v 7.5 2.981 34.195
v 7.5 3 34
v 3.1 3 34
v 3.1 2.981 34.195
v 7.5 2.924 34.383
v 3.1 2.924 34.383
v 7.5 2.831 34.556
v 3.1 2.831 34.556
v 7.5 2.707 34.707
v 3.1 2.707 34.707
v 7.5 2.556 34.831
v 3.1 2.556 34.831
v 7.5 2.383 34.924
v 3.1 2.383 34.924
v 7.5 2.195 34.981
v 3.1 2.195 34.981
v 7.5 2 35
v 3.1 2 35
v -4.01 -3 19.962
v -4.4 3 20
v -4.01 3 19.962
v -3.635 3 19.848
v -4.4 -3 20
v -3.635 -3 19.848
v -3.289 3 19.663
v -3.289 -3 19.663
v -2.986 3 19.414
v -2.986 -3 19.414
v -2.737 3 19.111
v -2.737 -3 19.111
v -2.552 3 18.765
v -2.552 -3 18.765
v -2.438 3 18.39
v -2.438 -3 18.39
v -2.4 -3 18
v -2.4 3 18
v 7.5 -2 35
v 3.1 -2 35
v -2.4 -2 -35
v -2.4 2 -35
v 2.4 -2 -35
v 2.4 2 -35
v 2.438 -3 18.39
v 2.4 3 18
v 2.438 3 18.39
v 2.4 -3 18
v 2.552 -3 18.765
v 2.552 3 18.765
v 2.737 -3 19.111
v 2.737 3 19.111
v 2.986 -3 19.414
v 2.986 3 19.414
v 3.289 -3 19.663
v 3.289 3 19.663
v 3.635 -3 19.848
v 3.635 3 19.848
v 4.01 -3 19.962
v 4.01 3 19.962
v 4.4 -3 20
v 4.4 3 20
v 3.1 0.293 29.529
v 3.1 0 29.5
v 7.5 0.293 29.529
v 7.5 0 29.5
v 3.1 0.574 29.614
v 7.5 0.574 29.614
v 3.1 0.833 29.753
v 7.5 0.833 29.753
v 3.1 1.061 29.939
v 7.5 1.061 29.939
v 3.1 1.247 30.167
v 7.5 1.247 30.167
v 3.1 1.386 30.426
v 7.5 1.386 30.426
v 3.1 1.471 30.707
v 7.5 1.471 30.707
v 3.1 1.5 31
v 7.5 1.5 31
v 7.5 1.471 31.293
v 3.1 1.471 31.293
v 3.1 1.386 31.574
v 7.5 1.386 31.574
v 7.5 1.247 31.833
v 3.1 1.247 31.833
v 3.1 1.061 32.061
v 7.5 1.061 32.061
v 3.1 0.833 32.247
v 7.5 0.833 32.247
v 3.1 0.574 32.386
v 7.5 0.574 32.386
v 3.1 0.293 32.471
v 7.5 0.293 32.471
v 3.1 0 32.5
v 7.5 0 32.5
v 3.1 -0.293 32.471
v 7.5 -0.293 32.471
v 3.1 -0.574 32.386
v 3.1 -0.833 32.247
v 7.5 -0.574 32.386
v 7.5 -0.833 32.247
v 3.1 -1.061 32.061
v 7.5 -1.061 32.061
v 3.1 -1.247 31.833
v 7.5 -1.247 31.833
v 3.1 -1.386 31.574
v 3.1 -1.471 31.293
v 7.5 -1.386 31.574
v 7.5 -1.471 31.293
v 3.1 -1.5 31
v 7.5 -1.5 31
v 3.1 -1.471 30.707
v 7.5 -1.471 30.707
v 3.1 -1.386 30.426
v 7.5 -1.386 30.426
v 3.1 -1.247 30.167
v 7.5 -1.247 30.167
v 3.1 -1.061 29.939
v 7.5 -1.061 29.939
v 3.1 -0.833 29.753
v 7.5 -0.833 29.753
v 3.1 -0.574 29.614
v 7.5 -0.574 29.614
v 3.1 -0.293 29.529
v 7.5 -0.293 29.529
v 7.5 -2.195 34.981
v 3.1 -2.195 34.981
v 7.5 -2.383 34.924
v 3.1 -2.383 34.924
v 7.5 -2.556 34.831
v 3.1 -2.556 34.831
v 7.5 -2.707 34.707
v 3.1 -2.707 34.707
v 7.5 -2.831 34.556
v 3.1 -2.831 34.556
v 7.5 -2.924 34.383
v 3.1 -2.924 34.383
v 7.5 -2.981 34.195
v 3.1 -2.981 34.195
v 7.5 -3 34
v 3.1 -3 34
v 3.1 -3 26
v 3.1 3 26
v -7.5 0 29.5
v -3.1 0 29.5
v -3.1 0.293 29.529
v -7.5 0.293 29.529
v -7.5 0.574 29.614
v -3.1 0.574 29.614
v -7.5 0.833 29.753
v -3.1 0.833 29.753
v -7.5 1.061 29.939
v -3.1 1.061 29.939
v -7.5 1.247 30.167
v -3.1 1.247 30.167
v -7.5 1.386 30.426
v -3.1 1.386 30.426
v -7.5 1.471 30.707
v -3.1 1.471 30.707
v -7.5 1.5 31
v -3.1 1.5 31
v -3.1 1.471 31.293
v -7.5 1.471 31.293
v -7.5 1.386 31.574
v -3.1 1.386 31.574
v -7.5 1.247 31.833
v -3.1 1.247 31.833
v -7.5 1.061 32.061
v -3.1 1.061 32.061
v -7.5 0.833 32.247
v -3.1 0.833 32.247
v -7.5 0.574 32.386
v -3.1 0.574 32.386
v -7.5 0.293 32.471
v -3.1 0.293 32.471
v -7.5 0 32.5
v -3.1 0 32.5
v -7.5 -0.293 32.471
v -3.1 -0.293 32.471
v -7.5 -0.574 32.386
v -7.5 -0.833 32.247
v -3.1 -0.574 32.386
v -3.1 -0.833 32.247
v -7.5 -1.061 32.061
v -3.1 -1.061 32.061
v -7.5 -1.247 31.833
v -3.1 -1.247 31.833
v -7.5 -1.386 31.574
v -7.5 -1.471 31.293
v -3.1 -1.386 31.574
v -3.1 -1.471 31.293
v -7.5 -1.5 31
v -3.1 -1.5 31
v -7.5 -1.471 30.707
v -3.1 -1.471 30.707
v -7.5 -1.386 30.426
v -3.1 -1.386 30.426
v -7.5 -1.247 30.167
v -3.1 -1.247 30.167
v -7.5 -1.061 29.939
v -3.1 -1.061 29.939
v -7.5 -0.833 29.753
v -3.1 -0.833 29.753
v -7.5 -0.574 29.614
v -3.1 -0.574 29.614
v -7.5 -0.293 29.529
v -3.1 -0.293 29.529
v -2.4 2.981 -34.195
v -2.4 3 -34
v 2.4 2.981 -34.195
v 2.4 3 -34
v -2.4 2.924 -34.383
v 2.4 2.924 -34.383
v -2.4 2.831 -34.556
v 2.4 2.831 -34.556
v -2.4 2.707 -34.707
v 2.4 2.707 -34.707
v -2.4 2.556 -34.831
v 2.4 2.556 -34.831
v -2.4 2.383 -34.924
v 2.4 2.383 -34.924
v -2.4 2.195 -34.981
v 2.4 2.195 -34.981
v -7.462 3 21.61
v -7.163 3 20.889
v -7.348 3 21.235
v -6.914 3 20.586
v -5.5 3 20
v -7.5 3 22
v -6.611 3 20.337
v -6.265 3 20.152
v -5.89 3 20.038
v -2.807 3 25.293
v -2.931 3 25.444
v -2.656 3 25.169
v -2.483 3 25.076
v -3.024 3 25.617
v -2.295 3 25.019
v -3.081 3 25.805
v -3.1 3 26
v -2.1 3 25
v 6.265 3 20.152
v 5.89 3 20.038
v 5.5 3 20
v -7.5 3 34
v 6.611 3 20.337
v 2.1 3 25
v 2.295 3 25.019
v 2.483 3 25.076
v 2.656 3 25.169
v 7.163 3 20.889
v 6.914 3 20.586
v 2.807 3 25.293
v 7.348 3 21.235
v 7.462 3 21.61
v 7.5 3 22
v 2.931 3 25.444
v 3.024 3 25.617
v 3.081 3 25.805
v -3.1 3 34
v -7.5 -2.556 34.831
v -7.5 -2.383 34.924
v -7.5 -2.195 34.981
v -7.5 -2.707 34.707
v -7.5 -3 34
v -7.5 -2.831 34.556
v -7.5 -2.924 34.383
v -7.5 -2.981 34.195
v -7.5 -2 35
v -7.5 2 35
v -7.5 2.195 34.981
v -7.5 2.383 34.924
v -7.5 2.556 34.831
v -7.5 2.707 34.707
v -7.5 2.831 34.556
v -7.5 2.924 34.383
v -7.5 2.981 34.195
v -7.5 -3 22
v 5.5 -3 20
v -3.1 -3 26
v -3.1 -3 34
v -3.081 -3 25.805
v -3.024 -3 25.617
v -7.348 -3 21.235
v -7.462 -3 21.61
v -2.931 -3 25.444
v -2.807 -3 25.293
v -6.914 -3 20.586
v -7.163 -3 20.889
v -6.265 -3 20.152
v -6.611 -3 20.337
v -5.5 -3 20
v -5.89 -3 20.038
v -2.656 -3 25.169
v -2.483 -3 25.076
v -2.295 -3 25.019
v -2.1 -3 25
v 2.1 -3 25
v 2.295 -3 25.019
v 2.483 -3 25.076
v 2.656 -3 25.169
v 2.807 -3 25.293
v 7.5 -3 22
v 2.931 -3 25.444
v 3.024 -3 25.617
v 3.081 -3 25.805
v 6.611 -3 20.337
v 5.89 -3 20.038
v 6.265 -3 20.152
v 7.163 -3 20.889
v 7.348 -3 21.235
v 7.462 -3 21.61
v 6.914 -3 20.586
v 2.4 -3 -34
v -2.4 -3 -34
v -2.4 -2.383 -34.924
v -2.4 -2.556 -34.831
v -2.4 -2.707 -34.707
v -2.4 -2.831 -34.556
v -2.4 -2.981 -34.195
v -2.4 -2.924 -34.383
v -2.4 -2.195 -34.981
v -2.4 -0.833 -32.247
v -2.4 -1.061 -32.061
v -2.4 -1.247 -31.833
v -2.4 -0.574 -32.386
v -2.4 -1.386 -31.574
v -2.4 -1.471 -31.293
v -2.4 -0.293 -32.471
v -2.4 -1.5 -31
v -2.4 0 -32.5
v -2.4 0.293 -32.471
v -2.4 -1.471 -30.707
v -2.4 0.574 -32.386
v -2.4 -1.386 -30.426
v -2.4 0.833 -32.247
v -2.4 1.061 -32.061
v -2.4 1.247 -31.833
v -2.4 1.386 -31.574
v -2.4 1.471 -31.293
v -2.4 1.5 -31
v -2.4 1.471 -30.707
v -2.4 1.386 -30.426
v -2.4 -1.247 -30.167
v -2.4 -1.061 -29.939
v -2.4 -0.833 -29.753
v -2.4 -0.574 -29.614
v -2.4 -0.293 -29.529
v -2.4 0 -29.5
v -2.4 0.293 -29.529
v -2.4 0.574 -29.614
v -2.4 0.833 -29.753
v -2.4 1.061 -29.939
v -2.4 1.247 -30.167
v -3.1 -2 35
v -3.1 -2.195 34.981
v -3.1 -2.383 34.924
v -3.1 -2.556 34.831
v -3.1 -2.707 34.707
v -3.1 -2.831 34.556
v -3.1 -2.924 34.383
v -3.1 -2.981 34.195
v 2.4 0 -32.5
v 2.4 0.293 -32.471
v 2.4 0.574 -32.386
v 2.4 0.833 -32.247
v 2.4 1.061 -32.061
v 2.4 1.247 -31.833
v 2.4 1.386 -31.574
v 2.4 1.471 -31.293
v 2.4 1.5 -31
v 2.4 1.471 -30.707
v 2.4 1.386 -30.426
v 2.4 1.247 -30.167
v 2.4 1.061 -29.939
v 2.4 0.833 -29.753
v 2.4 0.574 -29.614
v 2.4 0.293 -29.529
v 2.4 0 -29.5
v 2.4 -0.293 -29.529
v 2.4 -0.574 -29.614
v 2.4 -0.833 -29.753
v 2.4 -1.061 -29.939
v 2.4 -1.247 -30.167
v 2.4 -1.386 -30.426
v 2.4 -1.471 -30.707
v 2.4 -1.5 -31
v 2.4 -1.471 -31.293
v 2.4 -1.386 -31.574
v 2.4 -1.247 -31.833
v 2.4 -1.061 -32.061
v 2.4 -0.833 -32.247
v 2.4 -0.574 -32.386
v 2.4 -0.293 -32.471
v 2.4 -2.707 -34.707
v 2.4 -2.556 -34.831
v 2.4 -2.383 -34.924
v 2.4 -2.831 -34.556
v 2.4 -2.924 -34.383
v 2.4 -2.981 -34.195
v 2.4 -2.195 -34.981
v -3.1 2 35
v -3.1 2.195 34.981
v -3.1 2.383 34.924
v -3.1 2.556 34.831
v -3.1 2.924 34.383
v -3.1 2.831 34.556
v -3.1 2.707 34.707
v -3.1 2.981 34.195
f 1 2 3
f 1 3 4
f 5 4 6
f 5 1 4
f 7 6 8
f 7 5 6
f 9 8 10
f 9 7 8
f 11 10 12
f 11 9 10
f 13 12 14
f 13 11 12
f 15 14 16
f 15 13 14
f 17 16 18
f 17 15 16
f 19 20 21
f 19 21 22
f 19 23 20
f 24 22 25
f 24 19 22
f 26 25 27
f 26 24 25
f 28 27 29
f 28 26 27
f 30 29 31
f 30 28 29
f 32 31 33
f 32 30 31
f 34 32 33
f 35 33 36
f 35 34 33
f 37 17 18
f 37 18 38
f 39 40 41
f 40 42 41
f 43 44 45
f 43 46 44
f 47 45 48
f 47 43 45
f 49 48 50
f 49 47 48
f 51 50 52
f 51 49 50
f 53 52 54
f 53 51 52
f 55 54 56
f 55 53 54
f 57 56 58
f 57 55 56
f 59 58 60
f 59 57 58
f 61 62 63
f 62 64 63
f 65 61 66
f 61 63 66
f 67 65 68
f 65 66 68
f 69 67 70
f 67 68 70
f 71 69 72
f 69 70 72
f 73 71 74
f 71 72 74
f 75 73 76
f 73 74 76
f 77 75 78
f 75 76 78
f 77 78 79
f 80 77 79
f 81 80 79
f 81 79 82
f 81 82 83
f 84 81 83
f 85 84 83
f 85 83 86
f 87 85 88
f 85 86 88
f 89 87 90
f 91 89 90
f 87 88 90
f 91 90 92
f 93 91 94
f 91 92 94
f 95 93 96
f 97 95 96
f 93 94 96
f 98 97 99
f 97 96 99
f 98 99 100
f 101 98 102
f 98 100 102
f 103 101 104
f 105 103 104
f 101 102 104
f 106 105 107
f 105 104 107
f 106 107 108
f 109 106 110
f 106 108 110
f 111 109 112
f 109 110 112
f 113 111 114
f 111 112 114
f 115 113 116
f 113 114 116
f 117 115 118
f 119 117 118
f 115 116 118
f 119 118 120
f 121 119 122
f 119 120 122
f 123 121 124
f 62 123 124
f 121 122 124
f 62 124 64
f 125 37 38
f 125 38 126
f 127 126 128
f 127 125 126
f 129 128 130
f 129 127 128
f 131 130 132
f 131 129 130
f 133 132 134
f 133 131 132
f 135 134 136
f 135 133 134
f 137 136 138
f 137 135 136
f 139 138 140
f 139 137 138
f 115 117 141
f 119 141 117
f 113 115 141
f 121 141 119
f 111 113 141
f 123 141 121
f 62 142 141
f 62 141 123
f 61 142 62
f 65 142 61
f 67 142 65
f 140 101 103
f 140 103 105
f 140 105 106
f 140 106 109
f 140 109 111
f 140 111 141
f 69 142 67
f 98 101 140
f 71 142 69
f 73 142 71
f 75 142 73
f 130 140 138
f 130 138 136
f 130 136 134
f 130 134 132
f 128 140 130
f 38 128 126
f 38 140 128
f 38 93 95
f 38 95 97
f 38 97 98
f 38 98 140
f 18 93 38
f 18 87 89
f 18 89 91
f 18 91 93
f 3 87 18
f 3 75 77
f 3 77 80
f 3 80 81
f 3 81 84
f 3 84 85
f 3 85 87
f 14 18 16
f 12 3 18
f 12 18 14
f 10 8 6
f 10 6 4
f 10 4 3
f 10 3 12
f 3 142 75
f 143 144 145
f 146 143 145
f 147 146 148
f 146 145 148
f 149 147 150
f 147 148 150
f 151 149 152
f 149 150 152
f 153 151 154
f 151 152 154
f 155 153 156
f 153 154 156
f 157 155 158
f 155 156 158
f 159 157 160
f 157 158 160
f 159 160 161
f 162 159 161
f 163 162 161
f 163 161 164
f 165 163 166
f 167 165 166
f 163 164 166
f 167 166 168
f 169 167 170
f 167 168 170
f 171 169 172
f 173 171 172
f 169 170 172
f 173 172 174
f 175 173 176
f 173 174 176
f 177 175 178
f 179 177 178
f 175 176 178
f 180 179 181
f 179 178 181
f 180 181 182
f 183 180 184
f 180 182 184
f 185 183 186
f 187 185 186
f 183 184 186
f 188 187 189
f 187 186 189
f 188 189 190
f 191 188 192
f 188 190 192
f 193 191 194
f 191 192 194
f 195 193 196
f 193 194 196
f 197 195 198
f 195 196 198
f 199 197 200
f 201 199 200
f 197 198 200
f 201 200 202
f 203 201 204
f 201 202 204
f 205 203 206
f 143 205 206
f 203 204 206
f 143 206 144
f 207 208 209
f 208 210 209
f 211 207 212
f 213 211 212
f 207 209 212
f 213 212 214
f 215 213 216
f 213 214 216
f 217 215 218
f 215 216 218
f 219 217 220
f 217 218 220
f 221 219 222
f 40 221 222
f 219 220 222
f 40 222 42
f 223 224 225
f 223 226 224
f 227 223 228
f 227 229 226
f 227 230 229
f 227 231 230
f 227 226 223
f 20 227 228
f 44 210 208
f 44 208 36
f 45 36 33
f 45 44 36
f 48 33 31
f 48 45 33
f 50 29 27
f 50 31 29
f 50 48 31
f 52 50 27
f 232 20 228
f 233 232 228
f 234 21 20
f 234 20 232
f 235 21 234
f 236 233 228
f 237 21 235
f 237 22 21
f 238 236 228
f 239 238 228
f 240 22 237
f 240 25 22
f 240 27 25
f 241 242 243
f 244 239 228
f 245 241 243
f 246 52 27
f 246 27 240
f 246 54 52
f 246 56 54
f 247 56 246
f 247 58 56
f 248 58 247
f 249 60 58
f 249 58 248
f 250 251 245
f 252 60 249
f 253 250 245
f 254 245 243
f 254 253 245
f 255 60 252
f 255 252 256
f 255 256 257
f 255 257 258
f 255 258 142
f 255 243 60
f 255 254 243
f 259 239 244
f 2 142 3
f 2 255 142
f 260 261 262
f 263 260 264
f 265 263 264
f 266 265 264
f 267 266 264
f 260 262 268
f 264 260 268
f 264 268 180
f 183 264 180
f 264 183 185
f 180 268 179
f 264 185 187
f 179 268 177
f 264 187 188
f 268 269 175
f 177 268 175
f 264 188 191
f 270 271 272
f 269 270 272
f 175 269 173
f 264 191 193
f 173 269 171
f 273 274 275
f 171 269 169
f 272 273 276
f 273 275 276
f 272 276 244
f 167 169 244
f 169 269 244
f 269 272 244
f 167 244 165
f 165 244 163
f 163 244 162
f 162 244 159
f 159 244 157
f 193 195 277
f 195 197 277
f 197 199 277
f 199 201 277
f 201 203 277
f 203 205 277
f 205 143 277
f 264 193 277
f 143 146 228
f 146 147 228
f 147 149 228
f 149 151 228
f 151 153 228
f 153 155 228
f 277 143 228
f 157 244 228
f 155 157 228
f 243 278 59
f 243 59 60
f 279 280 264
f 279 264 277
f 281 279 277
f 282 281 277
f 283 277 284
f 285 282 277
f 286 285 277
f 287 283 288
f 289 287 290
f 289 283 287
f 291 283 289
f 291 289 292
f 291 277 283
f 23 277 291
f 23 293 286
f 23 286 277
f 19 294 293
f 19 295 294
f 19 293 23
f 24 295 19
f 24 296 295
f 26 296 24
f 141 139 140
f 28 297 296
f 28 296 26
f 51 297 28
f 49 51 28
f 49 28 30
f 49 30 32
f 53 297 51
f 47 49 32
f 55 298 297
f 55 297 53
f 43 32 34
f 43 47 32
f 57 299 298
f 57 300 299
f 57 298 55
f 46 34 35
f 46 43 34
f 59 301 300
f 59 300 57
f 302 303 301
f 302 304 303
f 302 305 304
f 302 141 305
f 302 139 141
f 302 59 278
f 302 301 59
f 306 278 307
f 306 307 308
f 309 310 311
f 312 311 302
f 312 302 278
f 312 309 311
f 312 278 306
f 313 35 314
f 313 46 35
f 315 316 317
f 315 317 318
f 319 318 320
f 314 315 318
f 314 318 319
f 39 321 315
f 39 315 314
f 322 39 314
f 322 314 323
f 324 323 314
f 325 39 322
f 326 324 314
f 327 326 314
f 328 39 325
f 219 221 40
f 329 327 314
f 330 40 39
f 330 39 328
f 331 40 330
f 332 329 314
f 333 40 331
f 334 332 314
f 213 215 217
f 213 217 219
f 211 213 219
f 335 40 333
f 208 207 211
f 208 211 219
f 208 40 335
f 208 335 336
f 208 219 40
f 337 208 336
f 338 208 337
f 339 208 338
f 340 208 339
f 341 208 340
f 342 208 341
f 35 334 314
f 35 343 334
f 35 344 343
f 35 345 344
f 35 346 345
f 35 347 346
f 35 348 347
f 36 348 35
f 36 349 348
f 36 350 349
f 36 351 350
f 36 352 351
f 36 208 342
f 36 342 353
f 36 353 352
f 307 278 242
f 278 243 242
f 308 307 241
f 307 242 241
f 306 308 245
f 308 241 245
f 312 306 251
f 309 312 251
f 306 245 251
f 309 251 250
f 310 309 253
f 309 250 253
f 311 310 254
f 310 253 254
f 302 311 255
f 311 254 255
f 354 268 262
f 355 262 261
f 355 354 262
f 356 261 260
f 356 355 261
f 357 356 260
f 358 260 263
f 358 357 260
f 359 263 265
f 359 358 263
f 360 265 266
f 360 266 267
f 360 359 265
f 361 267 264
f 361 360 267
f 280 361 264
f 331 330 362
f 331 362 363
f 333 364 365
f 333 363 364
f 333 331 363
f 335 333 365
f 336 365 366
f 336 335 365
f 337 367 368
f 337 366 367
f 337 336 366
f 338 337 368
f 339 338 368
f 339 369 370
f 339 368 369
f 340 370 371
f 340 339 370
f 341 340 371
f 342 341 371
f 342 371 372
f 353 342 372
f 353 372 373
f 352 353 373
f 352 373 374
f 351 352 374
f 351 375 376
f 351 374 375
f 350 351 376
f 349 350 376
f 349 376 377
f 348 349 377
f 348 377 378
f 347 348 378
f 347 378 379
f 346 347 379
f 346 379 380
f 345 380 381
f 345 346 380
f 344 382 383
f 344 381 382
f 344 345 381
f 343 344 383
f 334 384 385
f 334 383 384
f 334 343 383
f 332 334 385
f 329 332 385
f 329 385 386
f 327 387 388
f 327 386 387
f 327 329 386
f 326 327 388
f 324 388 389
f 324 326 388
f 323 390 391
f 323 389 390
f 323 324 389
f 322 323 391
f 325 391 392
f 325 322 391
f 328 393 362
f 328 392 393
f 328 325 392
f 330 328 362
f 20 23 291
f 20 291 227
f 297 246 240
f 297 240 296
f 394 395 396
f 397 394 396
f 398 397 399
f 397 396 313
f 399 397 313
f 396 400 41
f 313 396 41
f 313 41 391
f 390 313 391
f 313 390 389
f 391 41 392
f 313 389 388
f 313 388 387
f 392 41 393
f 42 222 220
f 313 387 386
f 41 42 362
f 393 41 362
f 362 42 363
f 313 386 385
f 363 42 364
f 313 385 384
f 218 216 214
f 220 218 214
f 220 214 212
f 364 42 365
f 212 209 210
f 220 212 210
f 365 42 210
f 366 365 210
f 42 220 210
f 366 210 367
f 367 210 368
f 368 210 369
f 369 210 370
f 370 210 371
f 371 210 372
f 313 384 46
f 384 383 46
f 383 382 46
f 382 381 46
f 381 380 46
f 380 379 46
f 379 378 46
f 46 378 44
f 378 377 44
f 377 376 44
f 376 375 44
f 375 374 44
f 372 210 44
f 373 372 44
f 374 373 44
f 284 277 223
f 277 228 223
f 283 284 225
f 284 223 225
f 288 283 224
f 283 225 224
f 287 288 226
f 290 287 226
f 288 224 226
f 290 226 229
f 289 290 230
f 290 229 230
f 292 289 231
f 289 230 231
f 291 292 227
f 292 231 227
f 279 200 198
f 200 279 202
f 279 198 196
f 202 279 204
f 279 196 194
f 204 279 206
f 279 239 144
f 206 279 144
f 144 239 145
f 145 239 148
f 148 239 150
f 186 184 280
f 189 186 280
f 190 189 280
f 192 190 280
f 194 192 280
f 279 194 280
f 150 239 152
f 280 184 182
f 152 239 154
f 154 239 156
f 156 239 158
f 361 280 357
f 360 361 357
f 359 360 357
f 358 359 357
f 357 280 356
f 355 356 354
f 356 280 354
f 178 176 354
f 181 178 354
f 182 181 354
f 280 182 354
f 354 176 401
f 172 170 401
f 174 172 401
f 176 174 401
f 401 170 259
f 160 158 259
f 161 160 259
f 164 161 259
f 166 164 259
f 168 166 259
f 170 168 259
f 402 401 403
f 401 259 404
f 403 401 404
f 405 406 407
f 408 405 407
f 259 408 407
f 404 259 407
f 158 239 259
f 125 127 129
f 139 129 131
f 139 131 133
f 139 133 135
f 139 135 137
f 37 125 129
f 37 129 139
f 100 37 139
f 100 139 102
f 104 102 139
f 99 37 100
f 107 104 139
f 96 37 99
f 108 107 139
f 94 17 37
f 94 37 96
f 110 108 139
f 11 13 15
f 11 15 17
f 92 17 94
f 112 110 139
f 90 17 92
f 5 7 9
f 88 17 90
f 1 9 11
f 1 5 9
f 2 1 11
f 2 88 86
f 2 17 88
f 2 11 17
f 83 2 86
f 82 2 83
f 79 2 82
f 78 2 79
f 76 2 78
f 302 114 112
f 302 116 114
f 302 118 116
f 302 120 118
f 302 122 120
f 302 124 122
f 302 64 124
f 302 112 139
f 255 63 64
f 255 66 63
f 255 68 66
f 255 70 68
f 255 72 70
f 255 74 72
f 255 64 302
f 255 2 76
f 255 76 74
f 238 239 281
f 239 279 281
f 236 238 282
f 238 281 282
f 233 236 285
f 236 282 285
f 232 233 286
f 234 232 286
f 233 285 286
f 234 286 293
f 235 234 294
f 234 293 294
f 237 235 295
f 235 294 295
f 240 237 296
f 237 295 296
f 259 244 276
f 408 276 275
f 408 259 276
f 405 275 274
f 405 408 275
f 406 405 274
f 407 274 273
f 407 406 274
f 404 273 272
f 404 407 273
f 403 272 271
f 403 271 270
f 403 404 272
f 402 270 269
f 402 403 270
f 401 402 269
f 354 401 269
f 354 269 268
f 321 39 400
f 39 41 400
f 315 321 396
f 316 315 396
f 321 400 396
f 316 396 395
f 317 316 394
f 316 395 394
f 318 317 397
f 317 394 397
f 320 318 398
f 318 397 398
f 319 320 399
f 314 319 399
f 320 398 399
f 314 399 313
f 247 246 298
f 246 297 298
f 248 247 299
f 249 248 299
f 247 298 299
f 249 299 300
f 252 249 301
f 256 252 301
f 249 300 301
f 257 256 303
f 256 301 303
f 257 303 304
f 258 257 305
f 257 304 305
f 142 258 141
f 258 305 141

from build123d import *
from build123d.topology import SkipClean

# Parameters (mm, degrees)
SALIENTE_EXTRUIR1_DEPTH    = 2.4
CORTAR_EXTRUIR1_DEPTH      = 36.210225787
CORTAR_EXTRUIR1_DEPTH_BACK = 36.210225787
CROQUIS2_R                 = 1.5
CROQUIS3_R                 = 1.5
SALIENTE_EXTRUIR2_DEPTH    = 7.5
CORTAR_EXTRUIR2_DEPTH      = 3.1
REDONDEO1_R                = 2
REDONDEO2_R                = 1


with BuildPart() as part:
    # Croquis1 → Saliente-Extruir1 (new, symmetric)
    with BuildSketch(Plane(origin=(0, 0, 0), x_dir=(0, 0, -1), z_dir=(1, 0, 0))):
        with BuildLine():
            Line((-34, 3), (34, 3))
            ThreePointArc((34, 3), (34.707106781, 2.707106781), (35, 2))
            Line((35, 2), (35, -2))
            ThreePointArc((35, -2), (34.707106781, -2.707106781), (34, -3))
            Line((34, -3), (-34, -3))
            ThreePointArc((-34, -3), (-34.707106781, -2.707106781), (-35, -2))
            Line((-35, -2), (-35, 2))
            ThreePointArc((-35, 2), (-34.707106781, 2.707106781), (-34, 3))
        make_face()
    extrude(amount=SALIENTE_EXTRUIR1_DEPTH, both=True)

    # Croquis2 → Cortar-Extruir1 (cut, two sides: drawn at the far end of the back side and taken through both)
    with BuildSketch(Plane(origin=(0, 0, 0), x_dir=(0, 0, -1), z_dir=(1, 0, 0)).offset(-CORTAR_EXTRUIR1_DEPTH_BACK)):
        with Locations((-31, 0)):
            Circle(CROQUIS2_R)
        with Locations((31, 0)):
            Circle(CROQUIS2_R)
    extrude(amount=CORTAR_EXTRUIR1_DEPTH + CORTAR_EXTRUIR1_DEPTH_BACK, mode=Mode.SUBTRACT)

    # Croquis3 → Saliente-Extruir2 (add, symmetric)
    with SkipClean():  # the faces are left unmerged after this step: merging them gives an invalid solid
        with BuildSketch(Plane(origin=(0, 0, 0), x_dir=(0, 0, -1), z_dir=(1, 0, 0))):
            with BuildLine():
                Line((-35, 2), (-35, -2))
                ThreePointArc((-35, -2), (-34.707106781, -2.707106781), (-34, -3))
                Line((-34, -3), (-20, -3))
                Line((-20, -3), (-20, 3))
                Line((-20, 3), (-34, 3))
                ThreePointArc((-34, 3), (-34.707106781, 2.707106781), (-35, 2))
            make_face()
            with Locations((-31, 0)):
                Circle(CROQUIS3_R, mode=Mode.SUBTRACT)
        extrude(amount=SALIENTE_EXTRUIR2_DEPTH, both=True)
    add(part.part.scale(1), mode=Mode.REPLACE)  # the faces are merged on a copy

    # Croquis4 → Cortar-Extruir2 (cut, symmetric)
    with BuildSketch(Plane(origin=(0, 0, 0), x_dir=(0, 0, -1), z_dir=(1, 0, 0))):
        with BuildLine():
            Line((-34, 3), (-25, 3))
            Line((-25, 3), (-25, -3))
            Line((-25, -3), (-34, -3))
            ThreePointArc((-34, -3), (-34.707106781, -2.707106781), (-35, -2))
            Line((-35, -2), (-35, 2))
            ThreePointArc((-35, 2), (-34.707106781, 2.707106781), (-34, 3))
        make_face()
    extrude(amount=CORTAR_EXTRUIR2_DEPTH, both=True, mode=Mode.SUBTRACT)

    # Redondeo1
    redondeo1_edges = [part.edges().sort_by_distance(p)[0] for p in [
        (-2.4, 0, 20),
        (2.4, 0, 20),
        (-7.5, 0, 20),
        (7.5, 0, 20),
    ]]
    fillet(redondeo1_edges, radius=REDONDEO1_R)

    # Redondeo2
    redondeo2_edges = [part.edges().sort_by_distance(p)[0] for p in [
        (3.1, 0, 25),
        (-3.1, 0, 25),
    ]]
    fillet(redondeo2_edges, radius=REDONDEO2_R)


solid = part.part
